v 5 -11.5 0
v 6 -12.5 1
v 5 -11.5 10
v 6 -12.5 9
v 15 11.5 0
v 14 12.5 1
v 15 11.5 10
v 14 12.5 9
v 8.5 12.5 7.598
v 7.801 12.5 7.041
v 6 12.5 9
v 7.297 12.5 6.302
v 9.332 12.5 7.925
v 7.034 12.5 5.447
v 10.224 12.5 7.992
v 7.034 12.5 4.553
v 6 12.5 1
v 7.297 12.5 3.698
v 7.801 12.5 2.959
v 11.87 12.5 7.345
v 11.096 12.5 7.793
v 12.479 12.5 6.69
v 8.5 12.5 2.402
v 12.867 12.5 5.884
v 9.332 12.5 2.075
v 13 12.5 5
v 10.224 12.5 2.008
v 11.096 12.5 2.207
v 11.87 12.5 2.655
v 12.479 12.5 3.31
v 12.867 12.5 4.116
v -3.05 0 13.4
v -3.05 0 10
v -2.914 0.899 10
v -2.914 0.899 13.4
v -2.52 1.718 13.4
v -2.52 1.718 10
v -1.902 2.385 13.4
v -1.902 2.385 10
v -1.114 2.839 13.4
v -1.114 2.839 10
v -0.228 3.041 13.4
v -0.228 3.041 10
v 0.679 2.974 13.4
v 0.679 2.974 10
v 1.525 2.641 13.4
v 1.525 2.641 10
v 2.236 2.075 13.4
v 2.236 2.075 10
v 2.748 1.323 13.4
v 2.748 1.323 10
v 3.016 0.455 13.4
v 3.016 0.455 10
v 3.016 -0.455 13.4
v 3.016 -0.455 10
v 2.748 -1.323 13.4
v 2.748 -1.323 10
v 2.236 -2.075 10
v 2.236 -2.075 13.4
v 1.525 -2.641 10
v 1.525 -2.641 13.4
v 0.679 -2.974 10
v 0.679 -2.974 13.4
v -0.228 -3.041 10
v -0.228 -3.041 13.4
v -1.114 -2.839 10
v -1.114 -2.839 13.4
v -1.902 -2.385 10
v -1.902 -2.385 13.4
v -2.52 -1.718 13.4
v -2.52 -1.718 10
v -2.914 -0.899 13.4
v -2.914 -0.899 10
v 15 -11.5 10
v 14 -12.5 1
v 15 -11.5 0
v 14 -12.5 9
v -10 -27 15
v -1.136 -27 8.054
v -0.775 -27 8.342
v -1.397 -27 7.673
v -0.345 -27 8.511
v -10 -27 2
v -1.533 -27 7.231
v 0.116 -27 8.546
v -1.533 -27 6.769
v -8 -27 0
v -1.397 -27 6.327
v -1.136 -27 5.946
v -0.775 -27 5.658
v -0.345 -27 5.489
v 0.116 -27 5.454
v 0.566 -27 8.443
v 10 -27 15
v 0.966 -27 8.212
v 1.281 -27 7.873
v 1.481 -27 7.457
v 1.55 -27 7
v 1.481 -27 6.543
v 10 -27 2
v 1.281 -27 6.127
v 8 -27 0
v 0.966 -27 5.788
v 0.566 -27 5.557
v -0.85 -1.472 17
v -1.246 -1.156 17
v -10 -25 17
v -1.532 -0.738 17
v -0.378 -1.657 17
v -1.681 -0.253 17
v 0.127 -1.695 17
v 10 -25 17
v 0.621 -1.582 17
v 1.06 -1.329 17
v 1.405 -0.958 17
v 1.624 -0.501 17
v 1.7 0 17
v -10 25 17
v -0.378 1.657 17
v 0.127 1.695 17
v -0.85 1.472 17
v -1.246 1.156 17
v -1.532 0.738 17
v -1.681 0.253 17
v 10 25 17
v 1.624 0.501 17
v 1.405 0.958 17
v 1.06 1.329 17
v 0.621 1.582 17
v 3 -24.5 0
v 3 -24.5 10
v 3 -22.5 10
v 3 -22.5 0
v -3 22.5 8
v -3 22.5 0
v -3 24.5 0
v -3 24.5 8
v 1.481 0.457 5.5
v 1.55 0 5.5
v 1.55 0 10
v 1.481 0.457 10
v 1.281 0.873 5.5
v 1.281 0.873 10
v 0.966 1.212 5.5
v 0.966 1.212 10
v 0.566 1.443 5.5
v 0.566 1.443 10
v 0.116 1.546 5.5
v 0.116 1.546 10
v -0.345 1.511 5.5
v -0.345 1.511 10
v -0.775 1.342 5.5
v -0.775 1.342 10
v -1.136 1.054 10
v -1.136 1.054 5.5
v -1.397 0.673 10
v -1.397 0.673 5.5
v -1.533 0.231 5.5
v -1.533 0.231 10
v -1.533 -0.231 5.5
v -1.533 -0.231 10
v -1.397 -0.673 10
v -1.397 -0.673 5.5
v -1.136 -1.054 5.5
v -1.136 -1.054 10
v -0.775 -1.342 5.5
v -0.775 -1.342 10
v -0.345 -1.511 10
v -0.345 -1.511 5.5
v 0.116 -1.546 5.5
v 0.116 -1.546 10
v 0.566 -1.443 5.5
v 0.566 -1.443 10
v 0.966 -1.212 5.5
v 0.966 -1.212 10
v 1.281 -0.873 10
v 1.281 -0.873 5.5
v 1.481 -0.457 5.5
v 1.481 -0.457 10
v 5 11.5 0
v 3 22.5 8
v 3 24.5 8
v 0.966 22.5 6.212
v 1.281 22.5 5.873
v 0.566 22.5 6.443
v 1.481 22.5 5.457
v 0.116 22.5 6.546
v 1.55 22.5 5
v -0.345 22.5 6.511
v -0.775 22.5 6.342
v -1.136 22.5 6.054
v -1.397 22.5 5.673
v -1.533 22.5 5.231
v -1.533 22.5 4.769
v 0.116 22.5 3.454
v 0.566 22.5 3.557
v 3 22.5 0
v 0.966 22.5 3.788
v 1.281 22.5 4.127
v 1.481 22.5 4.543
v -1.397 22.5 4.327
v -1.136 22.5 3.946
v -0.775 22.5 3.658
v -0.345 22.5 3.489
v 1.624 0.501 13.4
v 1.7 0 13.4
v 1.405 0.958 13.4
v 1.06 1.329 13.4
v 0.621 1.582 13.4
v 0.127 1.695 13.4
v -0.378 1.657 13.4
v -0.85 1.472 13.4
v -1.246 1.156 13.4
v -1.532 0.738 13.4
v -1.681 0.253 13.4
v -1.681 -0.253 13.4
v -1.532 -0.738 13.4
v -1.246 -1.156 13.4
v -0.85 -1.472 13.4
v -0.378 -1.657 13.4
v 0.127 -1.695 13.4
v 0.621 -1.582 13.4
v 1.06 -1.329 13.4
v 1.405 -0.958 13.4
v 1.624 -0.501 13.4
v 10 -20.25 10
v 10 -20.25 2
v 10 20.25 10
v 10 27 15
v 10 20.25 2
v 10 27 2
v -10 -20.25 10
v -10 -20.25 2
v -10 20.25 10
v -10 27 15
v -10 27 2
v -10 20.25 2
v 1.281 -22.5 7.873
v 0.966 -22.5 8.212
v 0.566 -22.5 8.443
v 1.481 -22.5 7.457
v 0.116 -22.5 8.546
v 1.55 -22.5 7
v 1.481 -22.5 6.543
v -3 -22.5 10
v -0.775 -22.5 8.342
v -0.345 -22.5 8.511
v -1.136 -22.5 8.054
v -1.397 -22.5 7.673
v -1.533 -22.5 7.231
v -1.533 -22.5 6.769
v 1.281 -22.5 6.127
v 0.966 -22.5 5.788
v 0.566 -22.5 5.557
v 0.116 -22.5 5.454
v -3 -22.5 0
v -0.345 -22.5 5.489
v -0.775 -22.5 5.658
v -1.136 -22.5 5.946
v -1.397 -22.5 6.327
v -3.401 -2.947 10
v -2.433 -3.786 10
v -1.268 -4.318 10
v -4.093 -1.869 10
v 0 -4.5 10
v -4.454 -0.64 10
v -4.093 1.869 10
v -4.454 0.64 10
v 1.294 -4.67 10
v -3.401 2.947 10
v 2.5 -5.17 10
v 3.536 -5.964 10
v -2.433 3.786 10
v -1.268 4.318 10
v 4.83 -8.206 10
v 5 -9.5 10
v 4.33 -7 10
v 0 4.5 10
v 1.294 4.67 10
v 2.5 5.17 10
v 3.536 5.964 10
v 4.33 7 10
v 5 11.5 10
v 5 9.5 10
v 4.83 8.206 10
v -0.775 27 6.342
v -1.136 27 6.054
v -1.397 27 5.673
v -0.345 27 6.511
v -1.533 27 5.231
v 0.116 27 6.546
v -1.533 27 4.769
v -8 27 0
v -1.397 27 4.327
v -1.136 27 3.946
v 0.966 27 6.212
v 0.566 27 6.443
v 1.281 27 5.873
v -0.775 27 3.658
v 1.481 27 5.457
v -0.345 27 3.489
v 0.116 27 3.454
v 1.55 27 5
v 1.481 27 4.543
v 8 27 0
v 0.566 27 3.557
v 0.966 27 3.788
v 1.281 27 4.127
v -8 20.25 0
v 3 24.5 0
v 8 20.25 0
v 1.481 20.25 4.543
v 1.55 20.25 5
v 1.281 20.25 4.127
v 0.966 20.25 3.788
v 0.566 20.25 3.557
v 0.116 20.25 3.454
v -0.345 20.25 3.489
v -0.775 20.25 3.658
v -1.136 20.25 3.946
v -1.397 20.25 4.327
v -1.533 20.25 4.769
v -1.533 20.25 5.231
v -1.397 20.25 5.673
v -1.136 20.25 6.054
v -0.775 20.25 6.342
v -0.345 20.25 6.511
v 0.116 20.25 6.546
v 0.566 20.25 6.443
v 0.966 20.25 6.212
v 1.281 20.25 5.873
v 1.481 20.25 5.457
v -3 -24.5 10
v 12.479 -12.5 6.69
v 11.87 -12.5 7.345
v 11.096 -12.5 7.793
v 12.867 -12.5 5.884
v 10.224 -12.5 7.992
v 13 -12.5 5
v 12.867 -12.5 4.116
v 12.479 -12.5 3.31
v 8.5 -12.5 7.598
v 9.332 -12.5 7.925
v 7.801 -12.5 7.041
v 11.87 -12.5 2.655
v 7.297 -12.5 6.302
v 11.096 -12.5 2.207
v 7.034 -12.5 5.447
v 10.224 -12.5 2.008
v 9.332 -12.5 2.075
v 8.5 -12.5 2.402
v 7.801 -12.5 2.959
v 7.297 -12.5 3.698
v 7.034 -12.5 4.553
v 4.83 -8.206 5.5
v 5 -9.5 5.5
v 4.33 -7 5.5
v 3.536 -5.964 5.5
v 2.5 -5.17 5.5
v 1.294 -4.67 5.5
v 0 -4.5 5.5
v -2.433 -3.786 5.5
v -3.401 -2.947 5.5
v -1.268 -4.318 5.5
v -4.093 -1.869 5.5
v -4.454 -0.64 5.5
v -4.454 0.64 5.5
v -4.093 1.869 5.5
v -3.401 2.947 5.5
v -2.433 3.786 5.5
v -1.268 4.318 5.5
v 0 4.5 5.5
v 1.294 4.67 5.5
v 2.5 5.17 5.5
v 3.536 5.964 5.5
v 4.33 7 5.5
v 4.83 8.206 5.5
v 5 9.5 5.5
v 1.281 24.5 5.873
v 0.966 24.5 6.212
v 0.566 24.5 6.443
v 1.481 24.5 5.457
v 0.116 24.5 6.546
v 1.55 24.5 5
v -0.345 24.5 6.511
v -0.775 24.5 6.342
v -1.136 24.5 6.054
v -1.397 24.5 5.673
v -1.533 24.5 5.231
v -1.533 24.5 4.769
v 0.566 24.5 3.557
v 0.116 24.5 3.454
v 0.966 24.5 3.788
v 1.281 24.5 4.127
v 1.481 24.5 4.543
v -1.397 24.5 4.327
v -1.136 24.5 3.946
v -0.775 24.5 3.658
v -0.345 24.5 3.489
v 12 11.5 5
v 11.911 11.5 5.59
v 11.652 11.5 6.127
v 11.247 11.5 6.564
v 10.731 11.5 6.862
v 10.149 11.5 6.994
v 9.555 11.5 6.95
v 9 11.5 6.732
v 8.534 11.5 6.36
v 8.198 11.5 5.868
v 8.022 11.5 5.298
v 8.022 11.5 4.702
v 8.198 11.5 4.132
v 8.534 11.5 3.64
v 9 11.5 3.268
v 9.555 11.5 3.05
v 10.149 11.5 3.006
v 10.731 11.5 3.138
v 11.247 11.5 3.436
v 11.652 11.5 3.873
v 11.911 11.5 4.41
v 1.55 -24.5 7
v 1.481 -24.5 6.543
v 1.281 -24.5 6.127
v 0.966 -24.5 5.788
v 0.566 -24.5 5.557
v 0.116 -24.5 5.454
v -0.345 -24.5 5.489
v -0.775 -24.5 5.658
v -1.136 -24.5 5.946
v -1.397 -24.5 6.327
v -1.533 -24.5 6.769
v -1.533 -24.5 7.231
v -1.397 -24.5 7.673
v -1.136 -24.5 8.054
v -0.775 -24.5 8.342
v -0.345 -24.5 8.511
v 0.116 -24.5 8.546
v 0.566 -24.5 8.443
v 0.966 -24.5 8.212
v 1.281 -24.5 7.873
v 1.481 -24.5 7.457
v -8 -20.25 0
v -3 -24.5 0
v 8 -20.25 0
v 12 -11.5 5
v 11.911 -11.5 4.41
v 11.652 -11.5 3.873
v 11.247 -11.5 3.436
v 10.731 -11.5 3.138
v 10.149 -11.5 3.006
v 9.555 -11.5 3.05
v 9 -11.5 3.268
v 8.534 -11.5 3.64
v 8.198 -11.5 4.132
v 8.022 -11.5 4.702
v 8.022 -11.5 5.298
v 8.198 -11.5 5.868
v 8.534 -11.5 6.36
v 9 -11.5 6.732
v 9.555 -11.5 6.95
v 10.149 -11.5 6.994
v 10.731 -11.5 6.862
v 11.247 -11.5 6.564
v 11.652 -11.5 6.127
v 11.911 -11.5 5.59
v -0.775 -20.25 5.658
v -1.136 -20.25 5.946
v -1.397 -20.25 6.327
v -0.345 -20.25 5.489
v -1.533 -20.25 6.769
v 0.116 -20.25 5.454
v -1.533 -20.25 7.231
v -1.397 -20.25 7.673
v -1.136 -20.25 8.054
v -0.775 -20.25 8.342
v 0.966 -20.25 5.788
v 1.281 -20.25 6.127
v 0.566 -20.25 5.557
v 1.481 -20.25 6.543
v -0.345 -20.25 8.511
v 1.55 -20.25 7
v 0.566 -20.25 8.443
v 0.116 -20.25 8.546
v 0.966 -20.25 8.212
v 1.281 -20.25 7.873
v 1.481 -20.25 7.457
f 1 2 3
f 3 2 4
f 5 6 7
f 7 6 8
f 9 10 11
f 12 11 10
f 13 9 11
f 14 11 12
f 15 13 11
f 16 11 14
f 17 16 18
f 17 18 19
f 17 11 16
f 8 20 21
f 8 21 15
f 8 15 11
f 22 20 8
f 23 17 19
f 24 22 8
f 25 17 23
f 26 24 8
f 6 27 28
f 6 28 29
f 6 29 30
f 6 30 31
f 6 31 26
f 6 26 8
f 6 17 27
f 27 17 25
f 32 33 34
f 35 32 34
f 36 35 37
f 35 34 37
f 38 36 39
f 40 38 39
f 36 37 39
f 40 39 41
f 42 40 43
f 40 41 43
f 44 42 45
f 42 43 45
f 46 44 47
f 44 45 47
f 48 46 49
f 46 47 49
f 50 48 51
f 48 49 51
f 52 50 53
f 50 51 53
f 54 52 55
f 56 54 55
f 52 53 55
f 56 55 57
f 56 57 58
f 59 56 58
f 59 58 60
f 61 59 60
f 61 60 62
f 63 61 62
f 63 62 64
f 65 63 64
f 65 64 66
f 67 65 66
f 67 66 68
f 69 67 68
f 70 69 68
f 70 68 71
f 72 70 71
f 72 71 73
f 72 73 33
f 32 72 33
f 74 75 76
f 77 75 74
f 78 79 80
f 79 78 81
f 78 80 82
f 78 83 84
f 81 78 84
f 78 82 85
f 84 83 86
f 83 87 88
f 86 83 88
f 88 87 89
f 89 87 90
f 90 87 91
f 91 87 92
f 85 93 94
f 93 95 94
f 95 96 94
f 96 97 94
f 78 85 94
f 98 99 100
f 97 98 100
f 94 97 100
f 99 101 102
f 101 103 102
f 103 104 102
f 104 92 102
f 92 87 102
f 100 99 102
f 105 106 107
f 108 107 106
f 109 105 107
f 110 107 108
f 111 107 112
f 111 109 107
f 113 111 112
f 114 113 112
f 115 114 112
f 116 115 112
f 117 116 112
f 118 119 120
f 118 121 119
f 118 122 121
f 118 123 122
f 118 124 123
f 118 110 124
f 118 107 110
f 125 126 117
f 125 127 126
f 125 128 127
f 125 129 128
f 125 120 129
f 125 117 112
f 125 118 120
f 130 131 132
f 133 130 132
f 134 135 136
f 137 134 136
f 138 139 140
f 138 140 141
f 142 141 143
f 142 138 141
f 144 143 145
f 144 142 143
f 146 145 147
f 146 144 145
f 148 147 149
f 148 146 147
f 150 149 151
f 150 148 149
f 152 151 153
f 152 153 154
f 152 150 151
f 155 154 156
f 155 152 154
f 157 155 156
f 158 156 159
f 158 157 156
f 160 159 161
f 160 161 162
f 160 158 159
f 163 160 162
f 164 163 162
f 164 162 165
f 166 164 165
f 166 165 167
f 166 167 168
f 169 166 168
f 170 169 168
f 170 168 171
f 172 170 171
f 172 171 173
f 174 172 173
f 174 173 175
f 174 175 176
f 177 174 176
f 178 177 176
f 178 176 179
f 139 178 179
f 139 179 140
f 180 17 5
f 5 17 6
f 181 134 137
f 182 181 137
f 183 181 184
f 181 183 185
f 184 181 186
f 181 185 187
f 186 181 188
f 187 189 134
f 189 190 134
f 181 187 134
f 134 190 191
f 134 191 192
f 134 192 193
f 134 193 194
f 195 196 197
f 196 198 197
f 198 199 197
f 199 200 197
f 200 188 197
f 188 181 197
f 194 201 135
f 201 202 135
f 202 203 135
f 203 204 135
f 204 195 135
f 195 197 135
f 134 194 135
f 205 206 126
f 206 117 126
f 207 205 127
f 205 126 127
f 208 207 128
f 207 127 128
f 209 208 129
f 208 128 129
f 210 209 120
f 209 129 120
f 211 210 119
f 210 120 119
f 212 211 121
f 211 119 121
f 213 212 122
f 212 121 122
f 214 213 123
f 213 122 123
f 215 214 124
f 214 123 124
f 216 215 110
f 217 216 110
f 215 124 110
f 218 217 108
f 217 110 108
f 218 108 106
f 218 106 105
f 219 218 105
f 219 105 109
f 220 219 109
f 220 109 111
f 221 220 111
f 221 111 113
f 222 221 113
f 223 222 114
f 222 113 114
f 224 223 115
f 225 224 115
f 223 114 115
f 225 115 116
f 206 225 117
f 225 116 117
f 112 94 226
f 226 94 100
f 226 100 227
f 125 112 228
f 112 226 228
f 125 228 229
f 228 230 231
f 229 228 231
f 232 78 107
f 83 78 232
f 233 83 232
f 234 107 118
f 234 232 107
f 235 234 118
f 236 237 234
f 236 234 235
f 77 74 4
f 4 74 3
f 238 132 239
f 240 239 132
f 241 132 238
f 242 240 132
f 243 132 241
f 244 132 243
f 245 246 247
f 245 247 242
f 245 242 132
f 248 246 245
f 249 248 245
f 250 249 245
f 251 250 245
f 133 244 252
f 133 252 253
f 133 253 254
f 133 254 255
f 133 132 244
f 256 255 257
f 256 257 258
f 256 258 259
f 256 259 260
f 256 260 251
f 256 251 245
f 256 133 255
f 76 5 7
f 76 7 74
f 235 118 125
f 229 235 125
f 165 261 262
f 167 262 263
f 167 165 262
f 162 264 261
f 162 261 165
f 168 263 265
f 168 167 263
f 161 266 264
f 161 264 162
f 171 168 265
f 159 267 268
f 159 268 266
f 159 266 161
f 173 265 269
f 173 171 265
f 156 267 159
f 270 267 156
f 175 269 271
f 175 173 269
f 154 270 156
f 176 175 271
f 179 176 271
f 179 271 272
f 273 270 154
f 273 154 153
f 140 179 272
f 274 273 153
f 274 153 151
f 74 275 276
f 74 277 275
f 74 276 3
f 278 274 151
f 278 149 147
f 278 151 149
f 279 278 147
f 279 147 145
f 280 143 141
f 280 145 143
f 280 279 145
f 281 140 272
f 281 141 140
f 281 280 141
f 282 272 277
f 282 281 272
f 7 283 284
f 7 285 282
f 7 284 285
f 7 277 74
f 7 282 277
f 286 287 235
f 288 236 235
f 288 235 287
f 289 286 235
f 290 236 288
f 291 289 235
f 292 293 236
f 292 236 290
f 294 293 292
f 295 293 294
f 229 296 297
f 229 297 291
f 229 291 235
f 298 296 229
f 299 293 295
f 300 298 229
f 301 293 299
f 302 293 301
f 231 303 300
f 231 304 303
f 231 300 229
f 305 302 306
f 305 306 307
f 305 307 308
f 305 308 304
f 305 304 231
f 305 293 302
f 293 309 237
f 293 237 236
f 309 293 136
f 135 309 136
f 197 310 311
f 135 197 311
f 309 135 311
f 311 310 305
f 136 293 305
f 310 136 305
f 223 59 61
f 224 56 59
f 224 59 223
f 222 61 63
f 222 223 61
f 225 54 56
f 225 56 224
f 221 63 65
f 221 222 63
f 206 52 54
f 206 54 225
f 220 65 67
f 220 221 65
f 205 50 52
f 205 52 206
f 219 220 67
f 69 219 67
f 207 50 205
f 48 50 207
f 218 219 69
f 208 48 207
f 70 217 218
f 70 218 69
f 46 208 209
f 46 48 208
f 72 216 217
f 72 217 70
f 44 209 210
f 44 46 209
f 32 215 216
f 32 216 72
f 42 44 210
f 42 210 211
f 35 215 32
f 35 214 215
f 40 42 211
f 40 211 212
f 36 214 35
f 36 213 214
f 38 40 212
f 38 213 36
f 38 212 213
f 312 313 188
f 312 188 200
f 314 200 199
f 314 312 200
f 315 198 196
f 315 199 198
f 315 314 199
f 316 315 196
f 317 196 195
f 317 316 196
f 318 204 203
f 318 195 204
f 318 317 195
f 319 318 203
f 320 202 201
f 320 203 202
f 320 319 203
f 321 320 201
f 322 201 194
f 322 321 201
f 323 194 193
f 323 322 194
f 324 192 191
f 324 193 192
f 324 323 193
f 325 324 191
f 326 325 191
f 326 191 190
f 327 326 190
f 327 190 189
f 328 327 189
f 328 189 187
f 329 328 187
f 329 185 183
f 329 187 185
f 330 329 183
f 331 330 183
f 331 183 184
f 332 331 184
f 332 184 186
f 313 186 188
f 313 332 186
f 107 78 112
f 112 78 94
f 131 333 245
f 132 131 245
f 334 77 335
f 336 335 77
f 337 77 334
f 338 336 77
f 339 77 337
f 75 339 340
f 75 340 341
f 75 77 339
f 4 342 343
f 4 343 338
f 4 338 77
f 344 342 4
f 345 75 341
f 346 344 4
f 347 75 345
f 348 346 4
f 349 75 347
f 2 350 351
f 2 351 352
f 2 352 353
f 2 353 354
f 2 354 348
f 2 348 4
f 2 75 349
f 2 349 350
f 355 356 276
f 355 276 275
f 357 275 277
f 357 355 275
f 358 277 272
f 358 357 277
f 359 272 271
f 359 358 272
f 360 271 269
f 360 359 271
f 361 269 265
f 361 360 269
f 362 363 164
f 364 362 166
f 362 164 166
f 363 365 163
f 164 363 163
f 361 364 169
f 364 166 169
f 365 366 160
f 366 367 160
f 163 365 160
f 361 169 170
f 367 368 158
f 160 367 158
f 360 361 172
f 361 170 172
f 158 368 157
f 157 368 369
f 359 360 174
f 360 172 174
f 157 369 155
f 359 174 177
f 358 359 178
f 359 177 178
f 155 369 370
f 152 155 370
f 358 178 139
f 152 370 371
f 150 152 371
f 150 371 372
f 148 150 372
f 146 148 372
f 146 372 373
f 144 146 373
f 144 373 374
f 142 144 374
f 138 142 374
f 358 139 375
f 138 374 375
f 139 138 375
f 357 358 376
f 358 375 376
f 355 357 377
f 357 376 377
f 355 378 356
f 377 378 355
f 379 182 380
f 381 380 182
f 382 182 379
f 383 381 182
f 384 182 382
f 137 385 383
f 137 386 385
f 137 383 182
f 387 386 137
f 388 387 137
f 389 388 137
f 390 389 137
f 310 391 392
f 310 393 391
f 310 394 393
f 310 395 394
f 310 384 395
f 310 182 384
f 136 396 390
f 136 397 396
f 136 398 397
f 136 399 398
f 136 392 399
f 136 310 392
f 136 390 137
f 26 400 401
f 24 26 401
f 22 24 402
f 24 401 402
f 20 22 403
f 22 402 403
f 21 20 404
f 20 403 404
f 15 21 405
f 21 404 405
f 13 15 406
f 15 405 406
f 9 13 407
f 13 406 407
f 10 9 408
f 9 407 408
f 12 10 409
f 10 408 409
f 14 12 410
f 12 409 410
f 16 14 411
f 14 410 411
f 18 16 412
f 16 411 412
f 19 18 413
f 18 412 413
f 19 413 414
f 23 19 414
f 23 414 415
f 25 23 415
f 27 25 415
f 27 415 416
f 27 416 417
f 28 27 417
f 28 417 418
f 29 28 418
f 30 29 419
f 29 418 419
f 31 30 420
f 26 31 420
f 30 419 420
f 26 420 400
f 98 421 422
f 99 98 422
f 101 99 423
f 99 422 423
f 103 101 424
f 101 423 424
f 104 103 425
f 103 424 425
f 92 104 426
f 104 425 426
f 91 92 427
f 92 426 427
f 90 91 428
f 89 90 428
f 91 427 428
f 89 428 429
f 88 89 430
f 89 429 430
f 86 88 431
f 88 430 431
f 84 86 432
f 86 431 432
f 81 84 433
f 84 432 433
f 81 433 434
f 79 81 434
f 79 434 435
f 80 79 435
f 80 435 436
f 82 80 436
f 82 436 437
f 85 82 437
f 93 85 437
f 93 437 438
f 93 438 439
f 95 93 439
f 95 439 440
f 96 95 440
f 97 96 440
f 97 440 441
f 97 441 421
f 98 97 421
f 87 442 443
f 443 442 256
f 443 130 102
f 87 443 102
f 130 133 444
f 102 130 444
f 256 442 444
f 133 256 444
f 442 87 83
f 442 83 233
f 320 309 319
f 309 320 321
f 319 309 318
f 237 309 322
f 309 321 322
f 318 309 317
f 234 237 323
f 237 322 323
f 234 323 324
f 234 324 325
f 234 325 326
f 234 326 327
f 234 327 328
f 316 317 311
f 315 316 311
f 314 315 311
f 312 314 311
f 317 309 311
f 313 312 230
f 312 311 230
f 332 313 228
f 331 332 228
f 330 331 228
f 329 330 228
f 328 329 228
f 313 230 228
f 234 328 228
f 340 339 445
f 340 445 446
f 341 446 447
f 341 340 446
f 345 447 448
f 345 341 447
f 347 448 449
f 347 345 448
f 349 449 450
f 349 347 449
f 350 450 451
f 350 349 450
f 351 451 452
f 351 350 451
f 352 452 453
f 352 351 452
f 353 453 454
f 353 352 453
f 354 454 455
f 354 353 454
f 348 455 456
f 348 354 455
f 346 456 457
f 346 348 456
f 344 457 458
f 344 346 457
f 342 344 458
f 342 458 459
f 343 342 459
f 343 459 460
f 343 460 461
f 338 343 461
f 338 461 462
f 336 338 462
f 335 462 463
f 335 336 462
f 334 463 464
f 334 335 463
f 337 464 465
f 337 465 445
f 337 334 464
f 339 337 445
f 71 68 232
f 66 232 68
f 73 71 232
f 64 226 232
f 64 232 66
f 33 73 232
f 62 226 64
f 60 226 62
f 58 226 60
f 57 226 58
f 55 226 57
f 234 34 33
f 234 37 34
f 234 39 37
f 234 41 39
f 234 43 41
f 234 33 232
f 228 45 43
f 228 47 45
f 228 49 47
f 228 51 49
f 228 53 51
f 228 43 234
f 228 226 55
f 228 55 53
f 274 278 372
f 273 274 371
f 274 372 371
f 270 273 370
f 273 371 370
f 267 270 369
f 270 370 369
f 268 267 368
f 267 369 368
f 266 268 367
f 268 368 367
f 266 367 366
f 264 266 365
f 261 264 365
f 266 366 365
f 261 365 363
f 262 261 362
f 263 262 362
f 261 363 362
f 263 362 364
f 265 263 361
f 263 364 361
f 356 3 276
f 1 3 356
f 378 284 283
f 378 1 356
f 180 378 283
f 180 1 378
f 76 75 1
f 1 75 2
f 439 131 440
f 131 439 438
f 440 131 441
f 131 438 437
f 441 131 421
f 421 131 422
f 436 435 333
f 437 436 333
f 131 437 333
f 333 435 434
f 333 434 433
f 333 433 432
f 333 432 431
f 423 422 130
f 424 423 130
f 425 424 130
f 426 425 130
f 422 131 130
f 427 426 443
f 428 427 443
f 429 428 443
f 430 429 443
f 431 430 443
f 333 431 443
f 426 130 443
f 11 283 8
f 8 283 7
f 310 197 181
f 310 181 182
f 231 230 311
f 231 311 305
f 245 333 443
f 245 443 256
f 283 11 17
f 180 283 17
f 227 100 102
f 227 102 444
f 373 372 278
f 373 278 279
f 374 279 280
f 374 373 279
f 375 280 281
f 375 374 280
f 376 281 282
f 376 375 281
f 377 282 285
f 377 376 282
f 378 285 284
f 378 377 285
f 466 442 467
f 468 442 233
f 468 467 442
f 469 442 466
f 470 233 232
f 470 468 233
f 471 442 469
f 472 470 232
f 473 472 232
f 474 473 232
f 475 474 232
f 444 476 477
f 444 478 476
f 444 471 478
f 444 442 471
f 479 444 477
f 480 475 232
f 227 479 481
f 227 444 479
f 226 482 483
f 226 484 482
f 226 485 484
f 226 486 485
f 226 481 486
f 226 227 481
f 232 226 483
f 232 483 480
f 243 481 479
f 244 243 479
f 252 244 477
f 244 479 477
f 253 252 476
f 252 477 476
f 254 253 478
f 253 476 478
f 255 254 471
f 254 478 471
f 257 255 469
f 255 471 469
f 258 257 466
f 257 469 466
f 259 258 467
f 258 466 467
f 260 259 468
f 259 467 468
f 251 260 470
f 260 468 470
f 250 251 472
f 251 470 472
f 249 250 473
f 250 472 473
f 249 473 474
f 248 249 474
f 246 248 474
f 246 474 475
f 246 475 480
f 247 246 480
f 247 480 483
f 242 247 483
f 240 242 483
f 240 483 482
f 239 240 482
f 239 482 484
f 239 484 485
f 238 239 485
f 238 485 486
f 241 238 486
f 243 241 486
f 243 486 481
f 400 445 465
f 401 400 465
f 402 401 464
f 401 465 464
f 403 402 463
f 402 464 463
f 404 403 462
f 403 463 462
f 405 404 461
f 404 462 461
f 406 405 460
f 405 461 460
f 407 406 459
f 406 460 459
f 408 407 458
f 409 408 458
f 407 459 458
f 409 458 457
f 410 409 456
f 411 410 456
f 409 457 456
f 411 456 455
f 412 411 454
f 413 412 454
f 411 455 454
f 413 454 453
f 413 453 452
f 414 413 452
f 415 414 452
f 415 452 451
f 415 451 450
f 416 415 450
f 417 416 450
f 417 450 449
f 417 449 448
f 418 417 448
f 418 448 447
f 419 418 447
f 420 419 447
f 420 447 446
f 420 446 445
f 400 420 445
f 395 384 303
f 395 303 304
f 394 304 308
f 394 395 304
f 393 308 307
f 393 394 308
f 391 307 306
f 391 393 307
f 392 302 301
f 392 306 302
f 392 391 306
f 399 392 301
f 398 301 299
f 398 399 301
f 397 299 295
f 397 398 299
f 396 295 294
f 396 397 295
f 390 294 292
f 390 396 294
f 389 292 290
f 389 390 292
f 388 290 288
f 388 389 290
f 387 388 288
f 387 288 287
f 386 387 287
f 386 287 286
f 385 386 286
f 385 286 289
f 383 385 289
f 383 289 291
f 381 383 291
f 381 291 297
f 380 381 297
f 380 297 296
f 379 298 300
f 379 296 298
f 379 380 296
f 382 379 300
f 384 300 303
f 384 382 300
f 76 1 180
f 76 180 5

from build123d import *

# Parameters (mm, degrees)
SKETCH_W             = 20
SKETCH_H             = 54
PAD_DEPTH            = 17
SKETCH001_W          = 40.5
SKETCH001_H          = 10
POCKET_DEPTH         = 10.001
POCKET_DEPTH_BACK    = 10.001
HOLE_D               = 3.4
HOLE_CBORE_D         = 6.1
HOLE_CBORE_DEPTH     = 3.4
BINDER_W             = 2
BINDER_H             = 6
POCKET005_DEPTH      = 10
BINDER001_W          = 2
BINDER001_H          = 6
POCKET006_DEPTH      = 8
BINDER002_R          = 1.55
POCKET007_DEPTH      = 27.001
BINDER003_R          = 1.55
POCKET008_DEPTH      = 27.001
CHAMFER001_SIZE      = 2
SKETCH005_R          = 1.55
PAD001_DEPTH         = 10
SKETCH006_W          = 12.587973
SKETCH006_H          = 28.979589
POCKET003_DEPTH      = 5.5
SKETCH007_R          = 2
POCKET004_DEPTH      = 12.501
POCKET004_DEPTH_BACK = 12.501
CHAMFER_SIZE         = 1


with BuildPart() as mount:
    # Sketch → Pad (new body)
    with BuildSketch(Plane.XY):
        Rectangle(SKETCH_W, SKETCH_H)
    extrude(amount=PAD_DEPTH)

    # Sketch001 → Pocket (cut, two sides)
    with BuildSketch(Plane.YZ) as pocket_sk:
        with Locations((0, 5)):
            Rectangle(SKETCH001_W, SKETCH001_H)
    extrude(amount=-POCKET_DEPTH, mode=Mode.SUBTRACT)
    extrude(pocket_sk.sketch, amount=POCKET_DEPTH_BACK, mode=Mode.SUBTRACT)

    # Hole (through all)
    with Locations(Plane(origin=(0, 0, 10), x_dir=(-1, 0, 0), z_dir=(0, 0, -1))):
        with Locations((0, 0)):
            CounterBoreHole(HOLE_D / 2, HOLE_CBORE_D / 2, HOLE_CBORE_DEPTH)

    # Binder → Pocket005 (cut)
    with BuildSketch(Plane(origin=(0, -23.5, 0), x_dir=(0, 1, 0), z_dir=(0, 0, 1))):
        Rectangle(BINDER_W, BINDER_H)
    extrude(amount=POCKET005_DEPTH, mode=Mode.SUBTRACT)

    # Binder001 → Pocket006 (cut)
    with BuildSketch(Plane(origin=(0, 23.5, 0), x_dir=(0, 1, 0), z_dir=(0, 0, 1))):
        Rectangle(BINDER001_W, BINDER001_H)
    extrude(amount=POCKET006_DEPTH, mode=Mode.SUBTRACT)

    # Binder002 → Pocket007 (cut, through all)
    with BuildSketch(Plane(origin=(0, 0, 5), x_dir=(1, 0, 0), z_dir=(0, 1, 0))):
        Circle(BINDER002_R)
    extrude(amount=POCKET007_DEPTH, mode=Mode.SUBTRACT)

    # Binder003 → Pocket008 (cut, through all)
    with BuildSketch(Plane(origin=(0, 0, 7), x_dir=(1, 0, 0), z_dir=(0, 1, 0))):
        Circle(BINDER003_R)
    extrude(amount=-POCKET008_DEPTH, mode=Mode.SUBTRACT)

    # Chamfer001
    chamfer001_edges = [mount.edges().sort_by_distance(p)[0] for p in [
        (-10, 23.625, 0),
        (10, 23.625, 0),
        (-10, -23.625, 0),
        (10, -23.625, 0),
        (0, 27, 17),
        (0, -27, 17),
    ]]
    chamfer(chamfer001_edges, length=CHAMFER001_SIZE)


with BuildPart() as filament_guide:
    # Sketch005 → Pad001 (new body)
    with BuildSketch(Plane.XY):
        with BuildLine():
            ThreePointArc((0, 4.5), (-4.5, 0), (0, -4.5))
            ThreePointArc((5, -9.5), (3.5355339059, -5.9644660941), (0, -4.5))
            Line((5, -12.5), (5, -9.5))
            Line((15, -12.5), (5, -12.5))
            Line((15, 12.5), (15, -12.5))
            Line((5, 12.5), (15, 12.5))
            Line((5, 9.5), (5, 12.5))
            ThreePointArc((0, 4.5), (3.5355339059, 5.9644660941), (5, 9.5))
        make_face()
        Circle(SKETCH005_R, mode=Mode.SUBTRACT)
    extrude(amount=PAD001_DEPTH)

    # Sketch006 → Pocket003 (cut)
    with BuildSketch(Plane.XY):
        with Locations((-1.2939865, -0.7668695)):
            Rectangle(SKETCH006_W, SKETCH006_H)
    extrude(amount=POCKET003_DEPTH, mode=Mode.SUBTRACT)

    # Sketch007 → Pocket004 (cut, two sides)
    with BuildSketch(Plane.XZ) as pocket004_sk:
        with Locations((10, 5)):
            Circle(SKETCH007_R)
    extrude(amount=-POCKET004_DEPTH, mode=Mode.SUBTRACT)
    extrude(pocket004_sk.sketch, amount=POCKET004_DEPTH_BACK, mode=Mode.SUBTRACT)

    # Chamfer
    chamfer_edges = [filament_guide.edges().sort_by_distance(p)[0] for p in [
        (5, 12.5, 5),
        (10, 12.5, 0),
        (10, 12.5, 10),
        (15, 12.5, 5),
        (8, 12.5, 5),
        (15, -12.5, 5),
        (10, -12.5, 0),
        (10, -12.5, 10),
        (5, -12.5, 5),
        (8, -12.5, 5),
    ]]
    chamfer(chamfer_edges, length=CHAMFER_SIZE)


solid = Compound([mount.part, filament_guide.part])
